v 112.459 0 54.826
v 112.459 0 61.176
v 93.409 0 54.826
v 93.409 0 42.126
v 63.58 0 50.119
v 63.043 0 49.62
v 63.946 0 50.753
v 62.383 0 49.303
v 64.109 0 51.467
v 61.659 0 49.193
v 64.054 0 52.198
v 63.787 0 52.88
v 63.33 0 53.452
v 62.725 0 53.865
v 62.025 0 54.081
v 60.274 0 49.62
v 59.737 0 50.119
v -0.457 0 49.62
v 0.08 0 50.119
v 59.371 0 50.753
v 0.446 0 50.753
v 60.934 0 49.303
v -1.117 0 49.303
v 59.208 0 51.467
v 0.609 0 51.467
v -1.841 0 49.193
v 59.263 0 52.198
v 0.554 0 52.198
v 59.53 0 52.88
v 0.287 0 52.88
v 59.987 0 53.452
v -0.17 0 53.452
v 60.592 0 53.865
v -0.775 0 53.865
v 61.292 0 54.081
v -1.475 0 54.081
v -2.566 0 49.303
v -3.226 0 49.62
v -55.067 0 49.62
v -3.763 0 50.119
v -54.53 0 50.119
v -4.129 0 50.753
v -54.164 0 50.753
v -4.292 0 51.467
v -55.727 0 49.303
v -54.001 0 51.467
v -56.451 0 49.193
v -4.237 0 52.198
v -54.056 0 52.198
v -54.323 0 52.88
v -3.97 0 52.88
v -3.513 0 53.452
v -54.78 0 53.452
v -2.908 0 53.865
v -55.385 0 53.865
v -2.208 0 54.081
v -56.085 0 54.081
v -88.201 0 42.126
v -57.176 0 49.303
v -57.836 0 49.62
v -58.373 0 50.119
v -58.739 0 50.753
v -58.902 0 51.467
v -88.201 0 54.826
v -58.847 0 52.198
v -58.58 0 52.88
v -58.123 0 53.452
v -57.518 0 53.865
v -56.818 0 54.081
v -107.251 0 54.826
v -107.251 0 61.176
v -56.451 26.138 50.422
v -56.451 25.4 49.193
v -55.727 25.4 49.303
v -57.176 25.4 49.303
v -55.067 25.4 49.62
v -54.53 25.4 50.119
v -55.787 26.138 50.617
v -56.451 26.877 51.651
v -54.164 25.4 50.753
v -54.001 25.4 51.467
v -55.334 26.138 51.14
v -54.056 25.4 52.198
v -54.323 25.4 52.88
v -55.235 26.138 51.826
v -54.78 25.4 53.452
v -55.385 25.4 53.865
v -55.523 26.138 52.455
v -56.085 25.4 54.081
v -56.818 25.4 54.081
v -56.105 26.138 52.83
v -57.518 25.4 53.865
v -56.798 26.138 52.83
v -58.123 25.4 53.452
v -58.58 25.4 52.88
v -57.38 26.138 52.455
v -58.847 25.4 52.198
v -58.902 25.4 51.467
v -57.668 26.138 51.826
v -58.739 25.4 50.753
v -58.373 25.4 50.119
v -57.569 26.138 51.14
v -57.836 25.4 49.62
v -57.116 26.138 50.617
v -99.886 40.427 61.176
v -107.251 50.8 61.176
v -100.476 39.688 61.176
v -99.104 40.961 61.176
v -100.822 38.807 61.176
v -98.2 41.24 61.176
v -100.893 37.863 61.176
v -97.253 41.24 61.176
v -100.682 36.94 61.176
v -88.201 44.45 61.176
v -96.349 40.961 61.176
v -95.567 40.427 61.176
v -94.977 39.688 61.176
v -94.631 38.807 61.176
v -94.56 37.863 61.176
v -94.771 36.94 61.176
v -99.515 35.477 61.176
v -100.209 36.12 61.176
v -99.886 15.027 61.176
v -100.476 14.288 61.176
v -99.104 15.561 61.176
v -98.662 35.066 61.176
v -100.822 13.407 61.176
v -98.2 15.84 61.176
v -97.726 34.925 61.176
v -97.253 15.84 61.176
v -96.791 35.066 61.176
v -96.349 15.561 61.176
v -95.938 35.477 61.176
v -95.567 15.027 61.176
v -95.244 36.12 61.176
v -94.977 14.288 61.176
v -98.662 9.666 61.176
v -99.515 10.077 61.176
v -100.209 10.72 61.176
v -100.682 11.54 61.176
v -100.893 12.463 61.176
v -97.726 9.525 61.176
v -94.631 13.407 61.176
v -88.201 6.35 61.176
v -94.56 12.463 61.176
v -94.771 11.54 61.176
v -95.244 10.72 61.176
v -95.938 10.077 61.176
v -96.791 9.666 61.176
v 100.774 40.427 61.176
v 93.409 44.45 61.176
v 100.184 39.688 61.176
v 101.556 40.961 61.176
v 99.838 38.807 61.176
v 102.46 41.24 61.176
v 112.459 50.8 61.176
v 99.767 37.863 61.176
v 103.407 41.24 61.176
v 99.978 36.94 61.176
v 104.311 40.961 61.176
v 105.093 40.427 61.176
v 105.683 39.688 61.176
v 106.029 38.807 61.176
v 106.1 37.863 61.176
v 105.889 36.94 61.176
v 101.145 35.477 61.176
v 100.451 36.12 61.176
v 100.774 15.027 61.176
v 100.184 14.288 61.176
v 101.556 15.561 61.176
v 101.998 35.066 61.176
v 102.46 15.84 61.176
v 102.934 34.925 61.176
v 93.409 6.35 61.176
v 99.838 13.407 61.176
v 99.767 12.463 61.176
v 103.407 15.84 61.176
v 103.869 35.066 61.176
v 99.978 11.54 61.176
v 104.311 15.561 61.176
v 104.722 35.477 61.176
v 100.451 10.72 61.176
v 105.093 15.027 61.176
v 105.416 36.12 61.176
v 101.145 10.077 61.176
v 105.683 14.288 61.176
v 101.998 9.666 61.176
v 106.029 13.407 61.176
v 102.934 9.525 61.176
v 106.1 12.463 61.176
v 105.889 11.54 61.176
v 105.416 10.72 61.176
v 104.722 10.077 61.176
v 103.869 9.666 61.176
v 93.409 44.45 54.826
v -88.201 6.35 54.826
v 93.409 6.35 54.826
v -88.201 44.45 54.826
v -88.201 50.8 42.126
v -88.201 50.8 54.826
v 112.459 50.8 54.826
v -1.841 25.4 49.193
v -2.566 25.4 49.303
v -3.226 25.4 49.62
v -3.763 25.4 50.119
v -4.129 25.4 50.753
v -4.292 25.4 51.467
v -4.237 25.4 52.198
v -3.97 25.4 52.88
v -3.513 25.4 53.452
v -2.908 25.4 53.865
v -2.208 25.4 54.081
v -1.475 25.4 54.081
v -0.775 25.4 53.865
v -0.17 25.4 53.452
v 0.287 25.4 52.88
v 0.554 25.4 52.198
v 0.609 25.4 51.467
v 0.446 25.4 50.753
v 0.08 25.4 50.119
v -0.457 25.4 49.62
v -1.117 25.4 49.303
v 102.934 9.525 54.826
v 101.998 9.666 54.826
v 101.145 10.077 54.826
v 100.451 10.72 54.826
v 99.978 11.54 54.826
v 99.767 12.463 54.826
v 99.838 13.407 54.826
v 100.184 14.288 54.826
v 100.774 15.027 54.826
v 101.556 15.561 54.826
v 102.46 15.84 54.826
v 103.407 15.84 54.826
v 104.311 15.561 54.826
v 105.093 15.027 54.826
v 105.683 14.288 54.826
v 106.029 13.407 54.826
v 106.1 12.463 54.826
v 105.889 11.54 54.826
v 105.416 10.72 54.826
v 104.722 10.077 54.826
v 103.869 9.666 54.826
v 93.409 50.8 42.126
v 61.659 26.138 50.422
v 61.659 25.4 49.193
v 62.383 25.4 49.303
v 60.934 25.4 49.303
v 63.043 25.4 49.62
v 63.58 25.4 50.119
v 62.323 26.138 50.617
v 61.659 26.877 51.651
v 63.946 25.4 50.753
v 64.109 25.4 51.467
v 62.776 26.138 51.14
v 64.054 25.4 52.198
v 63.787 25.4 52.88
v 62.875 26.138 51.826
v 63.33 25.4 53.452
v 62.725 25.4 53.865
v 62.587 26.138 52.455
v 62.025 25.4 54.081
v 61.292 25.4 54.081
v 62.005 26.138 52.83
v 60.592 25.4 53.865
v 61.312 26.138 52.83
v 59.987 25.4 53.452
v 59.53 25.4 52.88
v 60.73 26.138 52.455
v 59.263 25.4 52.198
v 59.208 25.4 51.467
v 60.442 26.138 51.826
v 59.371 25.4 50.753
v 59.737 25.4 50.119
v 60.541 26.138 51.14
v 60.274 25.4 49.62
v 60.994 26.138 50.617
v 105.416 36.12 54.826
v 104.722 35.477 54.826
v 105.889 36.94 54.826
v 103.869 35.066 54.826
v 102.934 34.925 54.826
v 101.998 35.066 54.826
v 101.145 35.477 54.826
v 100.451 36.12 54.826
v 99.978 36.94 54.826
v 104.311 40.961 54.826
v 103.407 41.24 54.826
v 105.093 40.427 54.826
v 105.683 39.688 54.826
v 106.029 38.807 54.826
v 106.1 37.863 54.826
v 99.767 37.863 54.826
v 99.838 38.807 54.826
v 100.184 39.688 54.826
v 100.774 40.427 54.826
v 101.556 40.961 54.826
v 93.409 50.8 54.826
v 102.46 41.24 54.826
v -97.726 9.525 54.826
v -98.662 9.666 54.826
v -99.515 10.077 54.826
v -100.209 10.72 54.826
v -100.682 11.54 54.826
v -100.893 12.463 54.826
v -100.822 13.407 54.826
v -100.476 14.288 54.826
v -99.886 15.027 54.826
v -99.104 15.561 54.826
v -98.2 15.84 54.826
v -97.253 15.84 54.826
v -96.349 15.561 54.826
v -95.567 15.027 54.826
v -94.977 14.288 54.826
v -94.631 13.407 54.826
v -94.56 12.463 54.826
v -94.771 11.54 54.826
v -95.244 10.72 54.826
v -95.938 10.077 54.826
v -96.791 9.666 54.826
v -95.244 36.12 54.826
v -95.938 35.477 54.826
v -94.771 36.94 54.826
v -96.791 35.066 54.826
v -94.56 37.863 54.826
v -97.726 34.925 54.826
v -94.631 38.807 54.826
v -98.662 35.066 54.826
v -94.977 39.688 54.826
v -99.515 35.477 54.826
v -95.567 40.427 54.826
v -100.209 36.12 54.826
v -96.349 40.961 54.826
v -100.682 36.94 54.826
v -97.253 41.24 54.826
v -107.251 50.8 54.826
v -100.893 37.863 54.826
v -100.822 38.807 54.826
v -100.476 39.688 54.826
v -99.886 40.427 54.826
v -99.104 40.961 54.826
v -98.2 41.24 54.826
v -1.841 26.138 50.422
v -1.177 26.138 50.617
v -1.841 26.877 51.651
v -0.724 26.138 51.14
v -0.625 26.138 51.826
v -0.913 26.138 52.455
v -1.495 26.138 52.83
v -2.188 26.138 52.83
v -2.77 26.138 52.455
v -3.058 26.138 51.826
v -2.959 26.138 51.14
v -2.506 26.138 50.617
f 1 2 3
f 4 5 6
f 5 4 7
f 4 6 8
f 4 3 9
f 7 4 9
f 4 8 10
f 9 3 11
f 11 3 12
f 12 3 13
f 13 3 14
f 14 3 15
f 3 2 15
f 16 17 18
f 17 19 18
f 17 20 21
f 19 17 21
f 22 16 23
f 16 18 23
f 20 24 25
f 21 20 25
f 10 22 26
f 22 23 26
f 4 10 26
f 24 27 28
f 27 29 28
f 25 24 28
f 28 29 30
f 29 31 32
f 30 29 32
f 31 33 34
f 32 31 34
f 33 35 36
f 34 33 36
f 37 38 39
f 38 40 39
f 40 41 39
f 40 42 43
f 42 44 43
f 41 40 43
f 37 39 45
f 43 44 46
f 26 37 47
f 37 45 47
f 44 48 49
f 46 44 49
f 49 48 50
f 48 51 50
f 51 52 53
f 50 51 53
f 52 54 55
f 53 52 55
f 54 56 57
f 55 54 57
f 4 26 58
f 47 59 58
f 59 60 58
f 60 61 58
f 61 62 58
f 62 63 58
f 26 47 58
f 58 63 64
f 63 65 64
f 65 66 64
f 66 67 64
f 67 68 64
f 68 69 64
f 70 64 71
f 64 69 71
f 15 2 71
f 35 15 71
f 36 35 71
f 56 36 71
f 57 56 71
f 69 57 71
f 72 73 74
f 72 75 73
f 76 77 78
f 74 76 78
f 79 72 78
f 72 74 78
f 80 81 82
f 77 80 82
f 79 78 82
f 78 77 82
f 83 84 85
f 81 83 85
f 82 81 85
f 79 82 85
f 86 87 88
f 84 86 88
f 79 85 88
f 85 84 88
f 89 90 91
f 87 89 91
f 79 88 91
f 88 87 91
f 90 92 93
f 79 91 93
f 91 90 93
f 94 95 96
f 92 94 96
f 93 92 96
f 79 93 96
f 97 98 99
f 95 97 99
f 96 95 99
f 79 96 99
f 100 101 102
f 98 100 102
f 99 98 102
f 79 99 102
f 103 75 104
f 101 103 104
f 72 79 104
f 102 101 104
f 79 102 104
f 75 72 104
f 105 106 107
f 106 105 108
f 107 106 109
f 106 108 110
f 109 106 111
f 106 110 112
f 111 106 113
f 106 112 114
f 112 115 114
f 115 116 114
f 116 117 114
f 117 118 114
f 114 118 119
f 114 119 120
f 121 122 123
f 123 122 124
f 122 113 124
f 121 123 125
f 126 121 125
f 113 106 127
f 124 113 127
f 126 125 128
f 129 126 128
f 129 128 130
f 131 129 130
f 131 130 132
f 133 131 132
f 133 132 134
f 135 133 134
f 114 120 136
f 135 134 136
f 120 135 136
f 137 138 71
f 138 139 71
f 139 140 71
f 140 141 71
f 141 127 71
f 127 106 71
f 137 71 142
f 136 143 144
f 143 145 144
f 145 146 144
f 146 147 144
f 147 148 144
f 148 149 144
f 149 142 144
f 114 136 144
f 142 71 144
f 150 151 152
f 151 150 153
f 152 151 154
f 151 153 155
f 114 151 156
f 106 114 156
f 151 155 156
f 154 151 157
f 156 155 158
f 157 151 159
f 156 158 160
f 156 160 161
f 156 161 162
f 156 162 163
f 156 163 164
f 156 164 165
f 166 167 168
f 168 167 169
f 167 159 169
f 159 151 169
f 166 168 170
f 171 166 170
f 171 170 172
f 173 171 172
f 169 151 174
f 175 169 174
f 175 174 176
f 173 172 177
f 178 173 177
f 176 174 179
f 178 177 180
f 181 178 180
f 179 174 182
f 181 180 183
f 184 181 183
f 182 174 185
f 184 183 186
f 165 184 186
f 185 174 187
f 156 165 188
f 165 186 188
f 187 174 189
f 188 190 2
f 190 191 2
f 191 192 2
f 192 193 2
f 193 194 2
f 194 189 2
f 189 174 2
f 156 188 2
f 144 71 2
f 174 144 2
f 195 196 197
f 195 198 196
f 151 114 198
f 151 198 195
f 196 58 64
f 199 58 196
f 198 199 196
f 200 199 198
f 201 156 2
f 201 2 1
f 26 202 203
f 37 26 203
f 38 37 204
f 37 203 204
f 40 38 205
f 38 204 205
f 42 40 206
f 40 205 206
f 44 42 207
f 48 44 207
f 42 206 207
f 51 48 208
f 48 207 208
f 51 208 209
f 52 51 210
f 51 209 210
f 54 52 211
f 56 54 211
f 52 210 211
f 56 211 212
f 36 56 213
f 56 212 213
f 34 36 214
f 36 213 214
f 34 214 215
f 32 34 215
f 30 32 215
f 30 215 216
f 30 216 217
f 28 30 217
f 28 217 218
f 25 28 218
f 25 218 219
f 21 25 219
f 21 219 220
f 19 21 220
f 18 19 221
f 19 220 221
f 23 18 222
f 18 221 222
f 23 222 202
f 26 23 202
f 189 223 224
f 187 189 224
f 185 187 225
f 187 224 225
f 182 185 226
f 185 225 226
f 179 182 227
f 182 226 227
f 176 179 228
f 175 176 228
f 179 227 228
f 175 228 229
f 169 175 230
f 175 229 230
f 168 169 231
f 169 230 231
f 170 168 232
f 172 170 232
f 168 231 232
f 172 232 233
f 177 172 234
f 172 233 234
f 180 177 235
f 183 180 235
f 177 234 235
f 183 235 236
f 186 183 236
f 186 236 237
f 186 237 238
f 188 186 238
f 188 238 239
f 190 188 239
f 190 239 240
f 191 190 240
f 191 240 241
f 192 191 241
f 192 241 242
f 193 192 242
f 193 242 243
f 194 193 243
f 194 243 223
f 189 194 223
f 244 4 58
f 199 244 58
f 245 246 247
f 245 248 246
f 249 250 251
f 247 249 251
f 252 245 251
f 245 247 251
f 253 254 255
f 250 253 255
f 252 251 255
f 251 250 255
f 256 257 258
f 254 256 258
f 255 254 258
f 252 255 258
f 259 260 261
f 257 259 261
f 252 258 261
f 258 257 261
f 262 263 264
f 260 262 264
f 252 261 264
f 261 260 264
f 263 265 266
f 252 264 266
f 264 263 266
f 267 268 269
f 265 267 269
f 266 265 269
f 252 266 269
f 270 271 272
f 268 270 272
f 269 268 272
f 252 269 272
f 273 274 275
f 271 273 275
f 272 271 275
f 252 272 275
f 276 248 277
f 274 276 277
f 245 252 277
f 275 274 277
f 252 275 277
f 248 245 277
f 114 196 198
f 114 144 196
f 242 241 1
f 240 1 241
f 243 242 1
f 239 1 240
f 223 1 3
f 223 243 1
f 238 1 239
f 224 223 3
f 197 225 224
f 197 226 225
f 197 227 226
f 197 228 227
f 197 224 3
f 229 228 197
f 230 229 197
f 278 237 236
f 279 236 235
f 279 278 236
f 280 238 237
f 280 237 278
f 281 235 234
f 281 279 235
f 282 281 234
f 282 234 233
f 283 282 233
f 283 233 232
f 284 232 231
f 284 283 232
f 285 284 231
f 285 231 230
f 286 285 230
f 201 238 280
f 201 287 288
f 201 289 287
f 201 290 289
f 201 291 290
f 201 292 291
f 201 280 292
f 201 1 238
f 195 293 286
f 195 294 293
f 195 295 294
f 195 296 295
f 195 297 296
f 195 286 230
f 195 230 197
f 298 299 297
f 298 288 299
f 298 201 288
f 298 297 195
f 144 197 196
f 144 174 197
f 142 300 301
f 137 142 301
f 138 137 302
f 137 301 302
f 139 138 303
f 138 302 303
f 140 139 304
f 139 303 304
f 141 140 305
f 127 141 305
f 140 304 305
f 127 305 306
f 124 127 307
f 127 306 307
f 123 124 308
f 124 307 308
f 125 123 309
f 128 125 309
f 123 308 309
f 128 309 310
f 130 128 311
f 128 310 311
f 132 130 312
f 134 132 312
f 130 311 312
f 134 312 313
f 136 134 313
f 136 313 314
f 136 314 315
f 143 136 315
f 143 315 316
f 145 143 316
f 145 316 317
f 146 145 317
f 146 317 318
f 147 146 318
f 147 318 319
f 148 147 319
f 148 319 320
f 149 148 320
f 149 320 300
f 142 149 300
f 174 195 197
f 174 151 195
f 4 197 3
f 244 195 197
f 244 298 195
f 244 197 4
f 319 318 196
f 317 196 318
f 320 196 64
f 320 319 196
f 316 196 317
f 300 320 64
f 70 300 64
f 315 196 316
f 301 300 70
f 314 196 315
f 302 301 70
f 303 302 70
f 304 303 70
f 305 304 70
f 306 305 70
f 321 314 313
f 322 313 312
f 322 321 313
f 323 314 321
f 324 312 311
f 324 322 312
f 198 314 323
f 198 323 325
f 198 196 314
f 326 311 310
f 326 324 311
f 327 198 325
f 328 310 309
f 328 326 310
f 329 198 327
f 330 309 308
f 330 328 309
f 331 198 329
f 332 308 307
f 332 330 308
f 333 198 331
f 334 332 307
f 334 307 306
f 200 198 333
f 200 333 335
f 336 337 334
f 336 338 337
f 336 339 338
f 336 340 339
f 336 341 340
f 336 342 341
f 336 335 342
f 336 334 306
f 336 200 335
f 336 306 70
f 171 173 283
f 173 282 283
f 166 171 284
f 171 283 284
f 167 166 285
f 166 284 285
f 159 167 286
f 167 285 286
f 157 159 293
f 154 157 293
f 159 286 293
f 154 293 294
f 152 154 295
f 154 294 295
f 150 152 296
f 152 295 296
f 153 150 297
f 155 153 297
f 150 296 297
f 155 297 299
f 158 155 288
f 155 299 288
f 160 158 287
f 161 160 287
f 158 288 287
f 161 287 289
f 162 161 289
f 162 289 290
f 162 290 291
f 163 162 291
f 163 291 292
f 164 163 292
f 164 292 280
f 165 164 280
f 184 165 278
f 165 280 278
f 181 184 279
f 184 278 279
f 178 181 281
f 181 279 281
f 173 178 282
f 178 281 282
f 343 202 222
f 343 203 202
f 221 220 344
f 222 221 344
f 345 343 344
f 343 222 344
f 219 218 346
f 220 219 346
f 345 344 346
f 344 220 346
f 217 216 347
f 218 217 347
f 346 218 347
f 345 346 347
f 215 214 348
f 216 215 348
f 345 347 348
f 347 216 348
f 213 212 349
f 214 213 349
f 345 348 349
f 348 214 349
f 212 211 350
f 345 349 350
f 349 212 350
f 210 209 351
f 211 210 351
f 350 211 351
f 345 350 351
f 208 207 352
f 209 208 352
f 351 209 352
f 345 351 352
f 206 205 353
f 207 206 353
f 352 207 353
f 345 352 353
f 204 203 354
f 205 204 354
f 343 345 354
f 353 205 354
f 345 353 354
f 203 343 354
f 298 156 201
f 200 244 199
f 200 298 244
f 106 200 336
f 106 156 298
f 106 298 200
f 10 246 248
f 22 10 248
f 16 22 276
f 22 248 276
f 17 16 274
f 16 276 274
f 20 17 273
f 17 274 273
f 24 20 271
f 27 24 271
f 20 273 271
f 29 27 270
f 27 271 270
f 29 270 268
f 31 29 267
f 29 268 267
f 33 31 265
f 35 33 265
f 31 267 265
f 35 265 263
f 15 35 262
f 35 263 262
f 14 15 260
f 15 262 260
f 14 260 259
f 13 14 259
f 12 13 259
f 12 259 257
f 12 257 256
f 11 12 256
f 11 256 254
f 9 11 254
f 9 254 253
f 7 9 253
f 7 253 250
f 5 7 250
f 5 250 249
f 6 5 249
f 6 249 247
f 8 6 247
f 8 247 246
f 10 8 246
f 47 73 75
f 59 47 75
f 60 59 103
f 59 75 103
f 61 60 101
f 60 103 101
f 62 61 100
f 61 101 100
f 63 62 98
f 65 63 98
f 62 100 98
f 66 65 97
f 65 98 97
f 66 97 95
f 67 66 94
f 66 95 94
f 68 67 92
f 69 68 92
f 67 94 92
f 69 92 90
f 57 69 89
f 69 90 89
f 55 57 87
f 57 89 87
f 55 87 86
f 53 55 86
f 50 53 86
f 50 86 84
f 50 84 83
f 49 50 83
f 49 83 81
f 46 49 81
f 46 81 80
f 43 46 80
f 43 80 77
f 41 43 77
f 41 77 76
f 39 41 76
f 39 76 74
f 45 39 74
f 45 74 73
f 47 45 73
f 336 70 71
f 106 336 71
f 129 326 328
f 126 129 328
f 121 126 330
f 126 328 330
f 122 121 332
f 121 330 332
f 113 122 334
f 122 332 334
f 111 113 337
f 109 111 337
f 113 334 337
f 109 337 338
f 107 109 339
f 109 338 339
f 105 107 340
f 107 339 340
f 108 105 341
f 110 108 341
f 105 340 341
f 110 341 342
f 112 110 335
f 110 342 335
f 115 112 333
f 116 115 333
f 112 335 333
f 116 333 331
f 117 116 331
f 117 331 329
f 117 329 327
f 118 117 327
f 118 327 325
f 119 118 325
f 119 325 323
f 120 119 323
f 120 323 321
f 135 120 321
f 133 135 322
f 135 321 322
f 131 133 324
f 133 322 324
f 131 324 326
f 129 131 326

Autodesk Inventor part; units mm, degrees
ref_plane "YZ Plane" through (0, 0, 0) normal (1, 0, 0) x (0, 1, 0)
ref_plane "XZ Plane" through (0, 0, 0) normal (0, 1, 0) x (-1, 0, 0)
ref_plane "XY Plane" through (0, 0, 0) normal (0, 0, 1) x (1, 0, 0)
sketch "Sketch1" plane through (0, 0, 0) normal (0, 1, 0) x (-1, 0, 0)
  line L0 (107.2514, 61.1758) -> (-112.4586, 61.1758)
  line L1 (-112.4586, 61.1758) -> (-112.4586, 42.1258)
  line L2 (-112.4586, 42.1258) -> (107.2514, 42.1258)
  line L3 (107.2514, 42.1258) -> (107.2514, 61.1758)
  point P0 (0, 0)
  dimension "d0" = 219.71
  dimension "d1" = 19.05
extrude "Extrusion1" add sketch "Sketch1" along normal blind 50.8
sketch "Sketch2" plane through (-107.2514, 0, 61.1758) normal (0, 0, 1) x (1, 0, 0)
  line L0 (0, 0) -> (219.71, 0) projected
  line L1 (0, 50.8) -> (219.71, 50.8) projected
  line L2 (0, 0) -> (0, 50.8) projected
  line L3 (219.71, 0) -> (219.71, 50.8) projected
  point P0 (107.2514, 0)
  point P1 (9.525, 38.1)
  point P2 (9.525, 12.7)
  point P3 (210.185, 12.7)
  point P4 (210.185, 38.1)
  dimension "d4" = 0
  dimension "d5" = 0
  dimension "d6" = 0
  dimension "d7" = 0
  dimension "d8" = 12.7
  dimension "d9" = 12.7
  dimension "d10" = 9.525
  dimension "d11" = 9.525
hole "Hole1" at (-97.7264, 38.1, 61.1758) at (-97.7264, 12.7, 61.1758) at (102.9336, 12.7, 61.1758) at (102.9336, 38.1, 61.1758) direction (0, 0, -1) diameter 6.35 end through all
sketch "Sketch3" plane through (-107.2514, 0, 61.1758) normal (0, 0, 1) x (1, 0, 0)
  line L0 (19.05, 44.45) -> (200.66, 44.45)
  line L1 (200.66, 44.45) -> (200.66, 6.35)
  line L2 (200.66, 6.35) -> (19.05, 6.35)
  line L3 (19.05, 6.35) -> (19.05, 44.45)
  line L4 (0, 0) -> (0, 50.8) projected
  line L5 (219.71, 0) -> (219.71, 50.8) projected
  line L6 (219.71, 50.8) -> (0, 50.8) projected
  line L7 (0, 0) -> (219.71, 0) projected
  point P0 (107.2514, 0)
  dimension "d19" = 19.05
  dimension "d20" = 19.05
  dimension "d21" = 6.35
  dimension "d22" = 6.35
extrude "Extrusion2" cut sketch "Sketch3" against normal blind 6.35 contours L0 L1 L2 L3
sketch "Sketch6" plane through (0, 50.8, 0) normal (0, 1, 0) x (1, 0, 0)
  line L0 (-88.2014, -54.8258) -> (-107.2514, -54.8258)
  line L1 (-107.2514, -54.8258) -> (-107.2514, -42.1258)
  line L2 (-107.2514, -42.1258) -> (-88.2014, -42.1258)
  line L3 (-88.2014, -42.1258) -> (-88.2014, -54.8258)
  line L4 (112.4586, -42.1258) -> (-107.2514, -42.1258) projected
  line L5 (-107.2514, -42.1258) -> (-107.2514, -61.1758) projected
  line L6 (112.4586, -54.8258) -> (93.4086, -54.8258)
  line L7 (93.4086, -54.8258) -> (93.4086, -42.1258)
  line L8 (93.4086, -42.1258) -> (112.4586, -42.1258)
  line L9 (112.4586, -42.1258) -> (112.4586, -54.8258)
  line L10 (112.4586, -61.1758) -> (112.4586, -42.1258) projected
  line L11 (-107.2514, -61.1758) -> (112.4586, -61.1758) projected
  point P0 (0, 0)
  dimension "d25" = 0
  dimension "d26" = 12.7
  dimension "d27" = 0
  dimension "d28" = 19.05
  dimension "d32" = 19.05
  dimension "d33" = 0
  dimension "d34" = 6.35
extrude "Extrusion3" cut sketch "Sketch6" against normal blind 76.2 contours L0 L1 L2 L3 | L4 L9 L6 L7
sketch "Sketch7" plane through (0, 0, 0) normal (0, -1, 0) x (1, 0, 0)
  line L0 (112.4586, 61.1758) -> (112.4586, 54.8258) projected
  line L1 (93.4086, 42.1258) -> (-88.2014, 42.1258) projected
  line L2 (-107.2514, 54.8258) -> (-107.2514, 61.1758) projected
  point P0 (0, 0)
  point P1 (61.6586, 51.6508)
  point P2 (-56.4514, 51.6508)
  dimension "d37" = 50.8
  dimension "d38" = 9.525
  dimension "d39" = 50.8
  dimension "d40" = 9.525
hole "Hole2" at (61.6586, 0, 51.6508) at (-56.4514, 0, 51.6508) direction (0, 1, 0) diameter 4.9149 depth 25.4 tip angle 118
sketch "Sketch8" plane through (0, 0, 0) normal (0, -1, 0) x (1, 0, 0)
  line L0 (112.4586, 61.1758) -> (112.4586, 54.8258) projected
  line L1 (93.4086, 42.1258) -> (-88.2014, 42.1258) projected
  point P0 (0, 0)
  point P1 (-1.8414, 51.6508)
  point P2 (-1.8414, 51.6508)
  dimension "d48" = 114.3
  dimension "d49" = 9.525
hole "Hole3" at (-1.8414, 0, 51.6508) direction (0, 1, 0) diameter 4.9149 depth 25.4 tip angle 118
properties part number "BottomWall"
